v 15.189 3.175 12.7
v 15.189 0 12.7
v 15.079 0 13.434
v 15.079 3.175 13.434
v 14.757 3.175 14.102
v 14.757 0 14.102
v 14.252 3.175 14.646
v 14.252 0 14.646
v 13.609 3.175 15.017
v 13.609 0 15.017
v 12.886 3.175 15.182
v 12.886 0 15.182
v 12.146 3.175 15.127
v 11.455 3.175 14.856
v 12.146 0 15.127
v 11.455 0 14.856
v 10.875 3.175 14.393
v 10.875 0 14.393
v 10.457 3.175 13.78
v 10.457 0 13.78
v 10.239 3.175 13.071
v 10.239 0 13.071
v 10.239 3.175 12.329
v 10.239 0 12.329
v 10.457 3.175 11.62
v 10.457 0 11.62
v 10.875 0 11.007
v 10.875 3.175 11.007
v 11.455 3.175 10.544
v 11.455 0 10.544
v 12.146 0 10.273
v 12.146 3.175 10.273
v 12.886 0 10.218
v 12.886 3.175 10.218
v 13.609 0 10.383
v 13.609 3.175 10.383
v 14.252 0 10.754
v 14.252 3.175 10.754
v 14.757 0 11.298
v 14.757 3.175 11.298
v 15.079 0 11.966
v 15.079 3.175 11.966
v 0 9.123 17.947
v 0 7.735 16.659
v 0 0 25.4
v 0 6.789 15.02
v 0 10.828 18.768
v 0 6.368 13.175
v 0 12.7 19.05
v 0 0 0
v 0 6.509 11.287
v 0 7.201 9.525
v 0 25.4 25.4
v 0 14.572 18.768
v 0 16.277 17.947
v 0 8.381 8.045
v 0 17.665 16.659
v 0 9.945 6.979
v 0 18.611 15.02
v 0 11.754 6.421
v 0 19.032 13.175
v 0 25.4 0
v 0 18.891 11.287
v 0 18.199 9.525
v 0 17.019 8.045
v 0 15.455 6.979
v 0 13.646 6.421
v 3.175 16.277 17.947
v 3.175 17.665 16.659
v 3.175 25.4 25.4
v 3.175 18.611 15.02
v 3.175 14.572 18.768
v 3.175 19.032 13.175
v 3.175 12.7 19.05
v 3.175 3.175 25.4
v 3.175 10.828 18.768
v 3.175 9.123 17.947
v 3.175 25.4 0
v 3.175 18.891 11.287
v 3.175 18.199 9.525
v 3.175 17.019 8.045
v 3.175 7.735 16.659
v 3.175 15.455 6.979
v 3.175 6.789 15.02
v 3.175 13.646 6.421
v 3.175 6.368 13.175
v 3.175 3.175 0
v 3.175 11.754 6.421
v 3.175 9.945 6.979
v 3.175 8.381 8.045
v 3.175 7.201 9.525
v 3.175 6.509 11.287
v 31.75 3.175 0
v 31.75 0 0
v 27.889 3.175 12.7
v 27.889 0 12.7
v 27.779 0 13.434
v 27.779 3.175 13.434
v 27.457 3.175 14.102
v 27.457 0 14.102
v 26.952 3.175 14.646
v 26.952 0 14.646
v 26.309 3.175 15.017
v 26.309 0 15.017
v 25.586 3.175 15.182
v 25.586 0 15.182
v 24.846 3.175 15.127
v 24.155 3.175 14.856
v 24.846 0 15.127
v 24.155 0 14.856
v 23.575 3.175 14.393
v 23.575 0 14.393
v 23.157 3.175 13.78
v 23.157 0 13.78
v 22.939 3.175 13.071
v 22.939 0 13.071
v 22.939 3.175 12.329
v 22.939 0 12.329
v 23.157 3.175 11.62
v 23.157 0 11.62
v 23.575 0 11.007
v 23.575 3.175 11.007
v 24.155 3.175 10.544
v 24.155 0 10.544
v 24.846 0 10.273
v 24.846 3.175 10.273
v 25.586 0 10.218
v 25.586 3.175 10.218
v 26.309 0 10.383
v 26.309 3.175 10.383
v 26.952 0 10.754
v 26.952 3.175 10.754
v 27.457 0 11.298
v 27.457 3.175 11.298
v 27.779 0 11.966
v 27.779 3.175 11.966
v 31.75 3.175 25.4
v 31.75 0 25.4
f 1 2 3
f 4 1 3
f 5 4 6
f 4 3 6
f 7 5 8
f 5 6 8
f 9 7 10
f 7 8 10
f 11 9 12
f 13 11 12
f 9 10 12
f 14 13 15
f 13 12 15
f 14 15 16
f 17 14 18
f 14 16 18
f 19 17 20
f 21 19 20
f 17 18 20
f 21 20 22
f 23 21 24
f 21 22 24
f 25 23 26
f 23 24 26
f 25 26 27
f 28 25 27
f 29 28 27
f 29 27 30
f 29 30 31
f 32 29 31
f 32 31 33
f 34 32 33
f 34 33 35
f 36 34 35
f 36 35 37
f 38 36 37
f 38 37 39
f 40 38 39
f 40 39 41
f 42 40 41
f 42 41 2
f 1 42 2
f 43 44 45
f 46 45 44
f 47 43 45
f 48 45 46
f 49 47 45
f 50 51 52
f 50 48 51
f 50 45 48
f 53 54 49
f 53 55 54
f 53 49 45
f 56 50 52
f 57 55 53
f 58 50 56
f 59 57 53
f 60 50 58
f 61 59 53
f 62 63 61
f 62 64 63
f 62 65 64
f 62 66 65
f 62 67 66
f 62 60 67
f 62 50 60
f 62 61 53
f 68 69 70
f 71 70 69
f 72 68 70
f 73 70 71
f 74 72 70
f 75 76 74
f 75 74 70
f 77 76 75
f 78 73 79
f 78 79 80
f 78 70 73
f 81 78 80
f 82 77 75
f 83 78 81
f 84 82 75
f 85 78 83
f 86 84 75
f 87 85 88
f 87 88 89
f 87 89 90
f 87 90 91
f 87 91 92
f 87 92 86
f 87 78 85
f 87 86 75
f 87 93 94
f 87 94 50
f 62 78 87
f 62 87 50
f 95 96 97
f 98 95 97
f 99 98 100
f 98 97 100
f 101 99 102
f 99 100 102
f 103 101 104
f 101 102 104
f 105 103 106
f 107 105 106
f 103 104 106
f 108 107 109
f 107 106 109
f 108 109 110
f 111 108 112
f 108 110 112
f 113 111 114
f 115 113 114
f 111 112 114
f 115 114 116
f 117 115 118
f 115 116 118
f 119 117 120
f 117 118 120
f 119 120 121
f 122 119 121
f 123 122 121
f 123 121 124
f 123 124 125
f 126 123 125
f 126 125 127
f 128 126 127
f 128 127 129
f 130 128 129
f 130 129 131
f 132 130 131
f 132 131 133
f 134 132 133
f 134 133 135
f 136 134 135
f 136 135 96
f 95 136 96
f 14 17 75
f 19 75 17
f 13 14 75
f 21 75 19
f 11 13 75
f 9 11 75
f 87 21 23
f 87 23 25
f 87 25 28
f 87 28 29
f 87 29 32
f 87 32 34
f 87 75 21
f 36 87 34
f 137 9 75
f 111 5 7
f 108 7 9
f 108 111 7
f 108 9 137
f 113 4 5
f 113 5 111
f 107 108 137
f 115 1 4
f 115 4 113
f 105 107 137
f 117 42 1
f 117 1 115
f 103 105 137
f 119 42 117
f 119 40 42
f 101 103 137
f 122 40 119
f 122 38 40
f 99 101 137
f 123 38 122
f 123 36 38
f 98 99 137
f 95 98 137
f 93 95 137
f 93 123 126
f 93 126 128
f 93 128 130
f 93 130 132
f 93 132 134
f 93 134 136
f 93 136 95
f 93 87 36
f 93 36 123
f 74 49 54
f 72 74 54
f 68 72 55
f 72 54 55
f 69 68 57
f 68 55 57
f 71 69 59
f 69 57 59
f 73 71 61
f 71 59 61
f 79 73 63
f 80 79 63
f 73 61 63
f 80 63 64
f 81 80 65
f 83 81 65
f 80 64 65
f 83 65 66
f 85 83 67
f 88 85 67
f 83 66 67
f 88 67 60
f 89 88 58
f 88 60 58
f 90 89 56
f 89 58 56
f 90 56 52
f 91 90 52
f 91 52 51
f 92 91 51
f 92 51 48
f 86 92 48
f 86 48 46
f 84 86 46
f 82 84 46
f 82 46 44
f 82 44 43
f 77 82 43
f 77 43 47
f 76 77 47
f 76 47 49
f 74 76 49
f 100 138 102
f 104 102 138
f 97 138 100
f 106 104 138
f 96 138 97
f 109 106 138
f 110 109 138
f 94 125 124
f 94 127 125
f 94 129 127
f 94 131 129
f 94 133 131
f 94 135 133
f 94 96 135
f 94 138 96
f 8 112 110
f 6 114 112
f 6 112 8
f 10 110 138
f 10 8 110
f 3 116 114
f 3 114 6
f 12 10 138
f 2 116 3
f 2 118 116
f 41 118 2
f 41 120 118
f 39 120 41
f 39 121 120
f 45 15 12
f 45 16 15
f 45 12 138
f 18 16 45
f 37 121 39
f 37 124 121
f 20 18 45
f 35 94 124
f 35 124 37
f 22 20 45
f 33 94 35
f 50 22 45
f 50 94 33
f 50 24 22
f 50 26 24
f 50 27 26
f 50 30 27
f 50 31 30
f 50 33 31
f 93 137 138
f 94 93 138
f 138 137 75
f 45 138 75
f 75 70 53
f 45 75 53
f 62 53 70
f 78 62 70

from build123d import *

# Parameters (mm, degrees)
BOSS_EXTRUDE1_DEPTH = 25.4
SKETCH3_R           = 6.35
CUT_EXTRUDE1_DEPTH  = 48.941448664
SKETCH2_R           = 2.4892
CUT_EXTRUDE2_DEPTH  = 48.941448664


with BuildPart() as part:
    # Sketch1 → Boss-Extrude1 (new body)
    with BuildSketch(Plane.XY):
        Polygon((0, 0), (0, 25.4), (3.175, 25.4), (3.175, 3.175), (31.75, 3.175), (31.75, 0), align=None)
    extrude(amount=BOSS_EXTRUDE1_DEPTH)

    # Sketch3 → Cut-Extrude1 (cut, through all)
    with BuildSketch(Plane.ZY):
        with Locations((12.7, 12.7)):
            Circle(SKETCH3_R)
    extrude(amount=-CUT_EXTRUDE1_DEPTH, mode=Mode.SUBTRACT)

    # Sketch2 → Cut-Extrude2 (cut, through all)
    with BuildSketch(Plane.XZ):
        with Locations((12.7, 12.7)):
            Circle(SKETCH2_R)
        with Locations((25.4, 12.7)):
            Circle(SKETCH2_R)
    extrude(amount=-CUT_EXTRUDE2_DEPTH, mode=Mode.SUBTRACT)


solid = part.part
